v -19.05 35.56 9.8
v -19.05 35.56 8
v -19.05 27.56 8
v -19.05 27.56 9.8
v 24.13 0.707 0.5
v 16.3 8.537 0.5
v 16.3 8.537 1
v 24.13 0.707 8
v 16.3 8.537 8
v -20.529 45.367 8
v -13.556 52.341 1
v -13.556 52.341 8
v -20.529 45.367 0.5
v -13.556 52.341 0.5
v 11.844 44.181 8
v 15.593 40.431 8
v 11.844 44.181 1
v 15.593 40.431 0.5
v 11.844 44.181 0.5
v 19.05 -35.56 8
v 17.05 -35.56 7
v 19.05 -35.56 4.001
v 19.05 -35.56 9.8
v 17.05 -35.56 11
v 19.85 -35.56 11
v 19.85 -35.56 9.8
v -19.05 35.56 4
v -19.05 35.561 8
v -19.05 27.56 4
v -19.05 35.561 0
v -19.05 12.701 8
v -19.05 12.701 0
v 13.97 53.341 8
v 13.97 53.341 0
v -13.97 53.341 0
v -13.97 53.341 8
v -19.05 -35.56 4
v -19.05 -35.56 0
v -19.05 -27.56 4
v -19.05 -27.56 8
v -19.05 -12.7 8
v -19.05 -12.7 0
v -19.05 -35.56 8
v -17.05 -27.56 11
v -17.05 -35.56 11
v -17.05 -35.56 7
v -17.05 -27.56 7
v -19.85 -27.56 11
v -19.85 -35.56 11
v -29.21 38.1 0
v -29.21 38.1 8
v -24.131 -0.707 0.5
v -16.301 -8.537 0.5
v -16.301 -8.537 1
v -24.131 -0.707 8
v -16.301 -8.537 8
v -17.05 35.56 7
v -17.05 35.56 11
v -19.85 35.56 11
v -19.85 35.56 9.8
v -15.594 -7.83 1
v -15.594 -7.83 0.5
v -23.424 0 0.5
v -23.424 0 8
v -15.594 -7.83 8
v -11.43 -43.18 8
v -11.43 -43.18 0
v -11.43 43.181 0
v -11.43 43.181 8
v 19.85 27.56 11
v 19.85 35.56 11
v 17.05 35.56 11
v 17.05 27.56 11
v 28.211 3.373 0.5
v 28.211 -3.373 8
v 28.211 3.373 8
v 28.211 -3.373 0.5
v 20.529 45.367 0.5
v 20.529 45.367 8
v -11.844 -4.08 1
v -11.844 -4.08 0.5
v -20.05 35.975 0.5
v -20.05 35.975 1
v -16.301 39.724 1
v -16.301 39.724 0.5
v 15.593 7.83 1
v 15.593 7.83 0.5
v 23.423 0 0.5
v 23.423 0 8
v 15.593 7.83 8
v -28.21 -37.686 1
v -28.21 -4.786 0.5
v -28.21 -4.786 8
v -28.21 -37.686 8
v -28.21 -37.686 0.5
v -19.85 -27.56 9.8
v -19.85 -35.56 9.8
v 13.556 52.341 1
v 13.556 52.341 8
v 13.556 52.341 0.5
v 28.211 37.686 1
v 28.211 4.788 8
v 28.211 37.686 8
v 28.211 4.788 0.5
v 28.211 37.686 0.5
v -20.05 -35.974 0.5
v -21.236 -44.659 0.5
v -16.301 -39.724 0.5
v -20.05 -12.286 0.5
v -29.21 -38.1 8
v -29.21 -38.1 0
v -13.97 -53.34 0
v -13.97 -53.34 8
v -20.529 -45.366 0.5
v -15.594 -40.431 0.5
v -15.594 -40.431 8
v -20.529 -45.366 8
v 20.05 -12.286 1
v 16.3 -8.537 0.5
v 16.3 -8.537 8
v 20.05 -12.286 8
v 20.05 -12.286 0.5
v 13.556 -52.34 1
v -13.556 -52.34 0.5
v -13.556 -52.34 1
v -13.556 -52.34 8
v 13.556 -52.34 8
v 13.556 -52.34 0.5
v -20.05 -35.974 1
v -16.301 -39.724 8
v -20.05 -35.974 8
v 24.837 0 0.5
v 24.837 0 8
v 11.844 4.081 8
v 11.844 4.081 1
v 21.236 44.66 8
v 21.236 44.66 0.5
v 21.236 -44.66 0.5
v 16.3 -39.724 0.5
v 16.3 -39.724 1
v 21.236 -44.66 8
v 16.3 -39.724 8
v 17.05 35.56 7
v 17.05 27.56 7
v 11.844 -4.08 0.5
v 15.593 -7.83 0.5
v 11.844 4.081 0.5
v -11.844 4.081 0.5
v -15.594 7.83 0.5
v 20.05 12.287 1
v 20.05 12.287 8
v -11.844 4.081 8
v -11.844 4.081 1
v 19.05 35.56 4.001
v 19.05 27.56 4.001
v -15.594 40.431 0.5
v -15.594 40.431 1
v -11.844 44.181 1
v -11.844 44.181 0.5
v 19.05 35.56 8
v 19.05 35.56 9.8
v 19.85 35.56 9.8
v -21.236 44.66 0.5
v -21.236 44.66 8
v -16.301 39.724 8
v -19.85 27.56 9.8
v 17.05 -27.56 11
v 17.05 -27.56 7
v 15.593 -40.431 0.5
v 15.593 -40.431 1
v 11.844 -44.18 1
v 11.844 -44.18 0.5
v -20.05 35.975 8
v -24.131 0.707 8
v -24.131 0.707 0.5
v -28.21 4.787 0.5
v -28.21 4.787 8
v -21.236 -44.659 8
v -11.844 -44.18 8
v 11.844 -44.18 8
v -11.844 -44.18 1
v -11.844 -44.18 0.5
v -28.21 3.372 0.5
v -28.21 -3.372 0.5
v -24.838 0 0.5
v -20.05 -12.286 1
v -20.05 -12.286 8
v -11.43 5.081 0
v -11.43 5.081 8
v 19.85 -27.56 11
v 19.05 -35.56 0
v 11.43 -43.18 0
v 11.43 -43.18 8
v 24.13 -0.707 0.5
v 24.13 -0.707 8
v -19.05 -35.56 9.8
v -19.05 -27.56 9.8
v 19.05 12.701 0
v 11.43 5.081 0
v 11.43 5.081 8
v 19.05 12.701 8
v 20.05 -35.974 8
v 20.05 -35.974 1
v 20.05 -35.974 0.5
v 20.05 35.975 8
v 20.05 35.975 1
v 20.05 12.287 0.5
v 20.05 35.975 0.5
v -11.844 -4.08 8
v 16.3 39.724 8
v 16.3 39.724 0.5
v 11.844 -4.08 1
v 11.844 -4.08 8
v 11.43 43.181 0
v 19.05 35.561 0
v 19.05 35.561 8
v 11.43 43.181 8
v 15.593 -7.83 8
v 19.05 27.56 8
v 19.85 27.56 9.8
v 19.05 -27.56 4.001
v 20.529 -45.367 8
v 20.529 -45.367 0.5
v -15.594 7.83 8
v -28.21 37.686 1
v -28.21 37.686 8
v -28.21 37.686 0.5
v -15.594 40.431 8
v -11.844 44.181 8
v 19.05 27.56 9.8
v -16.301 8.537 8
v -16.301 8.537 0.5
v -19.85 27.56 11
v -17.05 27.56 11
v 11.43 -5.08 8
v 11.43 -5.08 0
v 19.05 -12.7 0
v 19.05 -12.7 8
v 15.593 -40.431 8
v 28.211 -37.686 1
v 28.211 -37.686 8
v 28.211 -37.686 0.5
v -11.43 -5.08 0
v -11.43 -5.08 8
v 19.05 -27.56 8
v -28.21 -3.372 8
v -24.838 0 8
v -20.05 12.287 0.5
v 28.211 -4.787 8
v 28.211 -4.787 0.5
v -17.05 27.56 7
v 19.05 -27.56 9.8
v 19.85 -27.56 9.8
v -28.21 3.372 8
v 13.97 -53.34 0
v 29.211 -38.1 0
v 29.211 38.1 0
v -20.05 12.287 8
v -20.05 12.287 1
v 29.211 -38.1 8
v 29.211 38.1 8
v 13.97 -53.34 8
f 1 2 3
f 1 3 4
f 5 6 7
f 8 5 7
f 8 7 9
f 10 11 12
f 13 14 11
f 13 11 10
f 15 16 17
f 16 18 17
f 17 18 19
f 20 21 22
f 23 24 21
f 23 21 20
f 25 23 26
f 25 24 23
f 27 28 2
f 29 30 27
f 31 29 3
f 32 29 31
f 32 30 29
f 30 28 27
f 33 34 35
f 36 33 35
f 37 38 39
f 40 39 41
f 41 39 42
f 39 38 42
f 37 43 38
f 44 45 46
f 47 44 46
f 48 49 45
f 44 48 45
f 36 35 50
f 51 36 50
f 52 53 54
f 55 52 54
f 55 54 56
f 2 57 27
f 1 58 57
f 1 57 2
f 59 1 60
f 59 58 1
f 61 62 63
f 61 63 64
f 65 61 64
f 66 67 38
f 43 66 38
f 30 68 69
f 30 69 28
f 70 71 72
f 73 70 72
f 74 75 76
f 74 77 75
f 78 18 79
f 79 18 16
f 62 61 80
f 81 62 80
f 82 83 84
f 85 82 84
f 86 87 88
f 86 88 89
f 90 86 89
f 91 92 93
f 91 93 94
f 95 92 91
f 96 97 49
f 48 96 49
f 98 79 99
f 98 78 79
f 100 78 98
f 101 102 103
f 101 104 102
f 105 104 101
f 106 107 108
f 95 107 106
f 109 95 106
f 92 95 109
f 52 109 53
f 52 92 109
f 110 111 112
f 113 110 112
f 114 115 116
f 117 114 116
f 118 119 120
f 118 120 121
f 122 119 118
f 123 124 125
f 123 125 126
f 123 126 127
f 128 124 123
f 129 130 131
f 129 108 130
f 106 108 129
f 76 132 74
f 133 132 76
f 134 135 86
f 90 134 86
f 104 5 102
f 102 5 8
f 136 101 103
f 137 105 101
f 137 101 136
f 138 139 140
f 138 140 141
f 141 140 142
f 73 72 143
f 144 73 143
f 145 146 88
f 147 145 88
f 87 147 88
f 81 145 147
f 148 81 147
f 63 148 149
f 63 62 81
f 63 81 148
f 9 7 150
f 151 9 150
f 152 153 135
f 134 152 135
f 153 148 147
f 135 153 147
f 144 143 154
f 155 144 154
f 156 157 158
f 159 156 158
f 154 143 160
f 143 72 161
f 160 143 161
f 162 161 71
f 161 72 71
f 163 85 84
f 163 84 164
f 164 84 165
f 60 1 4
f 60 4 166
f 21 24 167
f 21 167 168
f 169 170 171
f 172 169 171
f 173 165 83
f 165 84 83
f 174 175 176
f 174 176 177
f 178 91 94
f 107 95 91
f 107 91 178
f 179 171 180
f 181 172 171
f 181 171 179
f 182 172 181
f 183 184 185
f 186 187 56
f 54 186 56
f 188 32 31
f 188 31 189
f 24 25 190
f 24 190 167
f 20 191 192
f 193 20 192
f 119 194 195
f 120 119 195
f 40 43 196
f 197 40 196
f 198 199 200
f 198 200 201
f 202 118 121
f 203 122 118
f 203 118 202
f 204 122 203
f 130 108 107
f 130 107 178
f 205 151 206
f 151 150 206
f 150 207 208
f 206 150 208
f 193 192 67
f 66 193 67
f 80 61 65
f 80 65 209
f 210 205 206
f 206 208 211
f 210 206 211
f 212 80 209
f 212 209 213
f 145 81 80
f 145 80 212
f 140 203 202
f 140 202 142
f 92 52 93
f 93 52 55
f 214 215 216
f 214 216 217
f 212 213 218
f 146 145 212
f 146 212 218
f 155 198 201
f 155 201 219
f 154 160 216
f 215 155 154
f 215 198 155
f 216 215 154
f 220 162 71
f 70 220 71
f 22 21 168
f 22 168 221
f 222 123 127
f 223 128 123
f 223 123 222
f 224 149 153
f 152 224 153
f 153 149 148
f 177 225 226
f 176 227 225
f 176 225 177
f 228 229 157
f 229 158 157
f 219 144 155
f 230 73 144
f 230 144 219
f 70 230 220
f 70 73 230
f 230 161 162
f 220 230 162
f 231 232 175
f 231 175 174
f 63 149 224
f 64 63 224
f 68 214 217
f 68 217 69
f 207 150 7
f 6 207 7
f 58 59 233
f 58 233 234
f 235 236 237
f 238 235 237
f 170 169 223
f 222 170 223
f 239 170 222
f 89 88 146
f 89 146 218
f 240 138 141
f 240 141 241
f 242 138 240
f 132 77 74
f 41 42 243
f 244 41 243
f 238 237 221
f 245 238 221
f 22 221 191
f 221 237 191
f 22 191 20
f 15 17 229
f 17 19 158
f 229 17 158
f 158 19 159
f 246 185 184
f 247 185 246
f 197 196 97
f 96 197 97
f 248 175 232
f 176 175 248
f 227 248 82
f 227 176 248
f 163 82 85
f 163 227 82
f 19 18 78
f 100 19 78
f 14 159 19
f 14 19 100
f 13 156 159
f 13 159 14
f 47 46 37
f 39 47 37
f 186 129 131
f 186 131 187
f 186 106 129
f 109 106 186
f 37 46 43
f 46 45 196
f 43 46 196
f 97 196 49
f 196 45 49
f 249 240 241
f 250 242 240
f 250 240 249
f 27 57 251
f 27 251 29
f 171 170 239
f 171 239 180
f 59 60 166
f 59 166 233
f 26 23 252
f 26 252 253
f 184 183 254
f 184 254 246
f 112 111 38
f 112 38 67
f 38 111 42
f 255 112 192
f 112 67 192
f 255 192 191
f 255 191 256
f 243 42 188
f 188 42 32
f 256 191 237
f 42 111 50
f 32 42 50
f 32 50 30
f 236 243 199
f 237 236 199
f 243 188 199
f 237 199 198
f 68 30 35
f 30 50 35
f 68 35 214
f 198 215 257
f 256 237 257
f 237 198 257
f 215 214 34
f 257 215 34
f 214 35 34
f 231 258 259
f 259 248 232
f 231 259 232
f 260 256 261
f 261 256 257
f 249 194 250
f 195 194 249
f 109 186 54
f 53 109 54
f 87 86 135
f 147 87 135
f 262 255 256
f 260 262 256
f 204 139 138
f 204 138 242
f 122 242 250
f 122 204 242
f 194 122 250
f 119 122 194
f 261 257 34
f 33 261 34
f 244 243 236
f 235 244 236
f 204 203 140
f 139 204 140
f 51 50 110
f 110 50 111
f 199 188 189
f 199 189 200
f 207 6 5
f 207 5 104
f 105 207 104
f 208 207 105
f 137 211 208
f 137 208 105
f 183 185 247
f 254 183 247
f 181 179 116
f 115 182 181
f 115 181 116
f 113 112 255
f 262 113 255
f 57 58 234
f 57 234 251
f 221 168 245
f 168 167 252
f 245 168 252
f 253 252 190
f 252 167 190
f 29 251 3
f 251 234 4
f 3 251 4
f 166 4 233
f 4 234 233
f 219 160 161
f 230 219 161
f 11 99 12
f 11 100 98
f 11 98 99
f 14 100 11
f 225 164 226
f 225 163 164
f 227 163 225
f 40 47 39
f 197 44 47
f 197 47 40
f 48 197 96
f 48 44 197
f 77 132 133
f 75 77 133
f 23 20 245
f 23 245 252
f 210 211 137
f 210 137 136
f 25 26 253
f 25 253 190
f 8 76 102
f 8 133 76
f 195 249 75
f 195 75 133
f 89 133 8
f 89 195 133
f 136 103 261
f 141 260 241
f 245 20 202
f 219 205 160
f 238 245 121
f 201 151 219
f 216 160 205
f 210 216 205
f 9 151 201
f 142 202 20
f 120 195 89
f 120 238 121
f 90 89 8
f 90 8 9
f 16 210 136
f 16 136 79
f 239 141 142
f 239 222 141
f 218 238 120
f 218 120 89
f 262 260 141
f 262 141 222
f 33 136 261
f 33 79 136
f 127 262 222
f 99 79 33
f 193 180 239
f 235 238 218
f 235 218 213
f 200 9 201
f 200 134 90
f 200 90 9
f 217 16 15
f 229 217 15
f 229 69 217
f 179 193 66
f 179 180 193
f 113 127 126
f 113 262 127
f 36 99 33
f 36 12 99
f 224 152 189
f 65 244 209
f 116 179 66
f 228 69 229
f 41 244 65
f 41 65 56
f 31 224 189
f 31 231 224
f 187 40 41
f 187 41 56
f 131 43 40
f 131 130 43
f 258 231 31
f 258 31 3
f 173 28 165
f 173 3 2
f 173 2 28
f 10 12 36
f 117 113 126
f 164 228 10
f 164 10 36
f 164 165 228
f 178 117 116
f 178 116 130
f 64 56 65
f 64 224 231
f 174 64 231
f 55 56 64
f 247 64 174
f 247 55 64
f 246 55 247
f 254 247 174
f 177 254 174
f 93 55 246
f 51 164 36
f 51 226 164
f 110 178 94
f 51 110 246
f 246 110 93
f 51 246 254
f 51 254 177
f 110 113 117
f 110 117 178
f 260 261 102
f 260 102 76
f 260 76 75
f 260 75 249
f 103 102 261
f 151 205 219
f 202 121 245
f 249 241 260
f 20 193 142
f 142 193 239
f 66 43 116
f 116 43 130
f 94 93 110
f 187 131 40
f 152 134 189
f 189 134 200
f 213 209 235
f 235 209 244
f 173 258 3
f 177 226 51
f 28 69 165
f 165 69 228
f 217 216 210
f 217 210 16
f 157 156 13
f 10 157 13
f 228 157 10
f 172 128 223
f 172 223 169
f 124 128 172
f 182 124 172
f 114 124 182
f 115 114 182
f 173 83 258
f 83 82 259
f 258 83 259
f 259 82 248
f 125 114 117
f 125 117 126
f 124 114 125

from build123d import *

# Parameters (mm, degrees)
PAD_DEPTH    = 8
THICKNESS_T  = -1
POCKET_DEPTH = 0.5
PAD001_DEPTH = 8
PAD002_DEPTH = 8
SKETCH003_W  = 1
SKETCH003_H  = 7.5
PAD003_DEPTH = 18
SKETCH004_W  = 1
SKETCH004_H  = 7.5
PAD004_DEPTH = 18
SKETCH005_W  = 1
SKETCH005_H  = 7.5
PAD005_DEPTH = 18
SKETCH006_W  = 1
SKETCH006_H  = 7.5
PAD006_DEPTH = 18
SKETCH007_W  = 1
SKETCH007_H  = 7.5
PAD007_DEPTH = 7
SKETCH008_W  = 1
SKETCH008_H  = 7.5
PAD008_DEPTH = 7
SKETCH009_W  = 1
SKETCH009_H  = 7.5
PAD009_DEPTH = 7
SKETCH010_W  = 1
SKETCH010_H  = 7.5
PAD010_DEPTH = 7


with BuildPart() as part:
    # Sketch → Pad (new body)
    with BuildSketch(Plane.XY):
        Polygon((-29.21, 38.1002724549), (-29.21, -38.0997275451), (-13.9697275451, -53.34), (13.9702724549, -53.34), (29.2105449098, -38.0997275451), (29.2105449098, 38.1002724549), (13.9702724549, 53.3405449098), (-13.9697275451, 53.3405449098), align=None)
        Polygon((-19.05, 35.5607622358), (-19.05, 12.7007622358), (-11.4302173259, 5.0809795617), (11.4297826741, 5.0809795617), (19.0495653481, 12.7007622358), (19.0495653481, 35.5607622358), (11.4297826741, 43.1805449098), (-11.4302173259, 43.1805449098), align=None, mode=Mode.SUBTRACT)
        Polygon((-19.05, -35.5602173259), (-19.05, -12.7002173259), (-11.4302173259, -5.0804346519), (11.4297826741, -5.0804346519), (19.0495653481, -12.7002173259), (19.0495653481, -35.5602173259), (11.4297826741, -43.18), (-11.4302173259, -43.18), align=None, mode=Mode.SUBTRACT)
    extrude(amount=PAD_DEPTH)

    # Thickness
    thickness_openings = [part.faces().sort_by_distance(p)[0] for p in [
        (0.000695, 0.000272, 8),
    ]]
    offset(amount=THICKNESS_T, openings=thickness_openings, kind=Kind.INTERSECTION)

    # Thickness Face35 → Pocket (cut)
    with BuildSketch(Plane(origin=(0.0008428897, 0.0002724549, 1), x_dir=(0, 1, 0), z_dir=(0, 0, 1))):
        Polygon((37.6857864376, 28.2108428897), (-37.6857864376, 28.2108428897), (-52.3402724549, 13.5563568724), (-52.3402724549, -13.5552160028), (-37.6857864376, -28.2097020201), (37.6857864376, -28.2097020201), (52.3402724549, -13.5552160028), (52.3402724549, 13.5563568724), align=None)
        Polygon((35.9747033432, 20.0508428897), (44.1802724549, 11.845273778), (44.1802724549, -11.8431533467), (35.9747033432, -20.0487224584), (12.2862762185, -20.0487224584), (4.0807071068, -11.8431533467), (4.0807071068, 11.845273778), (12.2862762185, 20.0508428897), align=None, mode=Mode.SUBTRACT)
        Polygon((-35.9747033432, 20.0508428897), (-12.2862762185, 20.0508428897), (-4.0807071068, 11.845273778), (-4.0807071068, -11.8431533467), (-12.2862762185, -20.0487224584), (-35.9747033432, -20.0487224584), (-44.1802724549, -11.8431533467), (-44.1802724549, 11.845273778), align=None, mode=Mode.SUBTRACT)
    extrude(amount=-POCKET_DEPTH, mode=Mode.SUBTRACT)

    # Sketch001 → Pad001 (join)
    with BuildSketch(Plane.XZ.offset(35.56)):
        Polygon((-19.05, 4), (-19.05, 9.8), (-19.85, 9.8), (-19.85, 11), (-17.05, 11), (-17.05, 7), align=None)
        Polygon((19.05, 4), (19.05, 9.8), (19.85, 9.8), (19.85, 11), (17.05, 11), (17.05, 7), align=None)
    extrude(amount=-PAD001_DEPTH)

    # Sketch002 → Pad002 (join)
    with BuildSketch(Plane.XZ.offset(-35.56)):
        Polygon((-19.05, 4), (-19.05, 9.8), (-19.85, 9.8), (-19.85, 11), (-17.05, 11), (-17.05, 7), align=None)
        Polygon((19.05, 4), (19.05, 9.8), (19.85, 9.8), (19.85, 11), (17.05, 11), (17.05, 7), align=None)
    extrude(amount=PAD002_DEPTH)

    # Sketch003 (on Face77 of Pad002) → Pad003 (join)
    with BuildSketch(Plane(origin=(3.8815083374, -3.8815083374, 0), x_dir=(0.7071067812, 0.7071067812, 0), z_dir=(0.7071067812, -0.7071067812, 0))):
        with Locations((17.0628719395, 4.25)):
            Rectangle(SKETCH003_W, SKETCH003_H)
    extrude(amount=PAD003_DEPTH)

    # Sketch004 (on Face56 of Pad003) → Pad004 (join)
    with BuildSketch(Plane(origin=(3.8817807923, 3.8817807923, 0), x_dir=(-0.7071067812, 0.7071067812, 0), z_dir=(0.7071067812, 0.7071067812, 0))):
        with Locations((-17.06248663, 4.25)):
            Rectangle(SKETCH004_W, SKETCH004_H)
    extrude(amount=PAD004_DEPTH)

    # Sketch005 (on Face84 of Pad004) → Pad005 (join)
    with BuildSketch(Plane(origin=(-3.8817256633, -3.8817256633, 0), x_dir=(0.7071067812, -0.7071067812, 0), z_dir=(-0.7071067812, -0.7071067812, 0))):
        with Locations((-17.0631792847, 4.25)):
            Rectangle(SKETCH005_W, SKETCH005_H)
    extrude(amount=PAD005_DEPTH)

    # Sketch006 (on Face69 of Pad005) → Pad006 (join)
    with BuildSketch(Plane(origin=(-3.8819981182, 3.8819981182, 0), x_dir=(-0.7071067812, -0.7071067812, 0), z_dir=(-0.7071067812, 0.7071067812, 0))):
        with Locations((17.0627939753, 4.25)):
            Rectangle(SKETCH006_W, SKETCH006_H)
    extrude(amount=PAD006_DEPTH)

    # Sketch007 (on Face79 of Pad006) → Pad007 (join)
    with BuildSketch(Plane(origin=(-28.0124878991, 28.0124878991, 0), x_dir=(-0.7071067812, -0.7071067812, 0), z_dir=(-0.7071067812, 0.7071067812, 0))):
        with Locations((-17.0628719395, 4.25)):
            Rectangle(SKETCH007_W, SKETCH007_H)
    extrude(amount=PAD007_DEPTH)

    # Sketch008 (on Face73 of Pad007) → Pad008 (join)
    with BuildSketch(Plane(origin=(-28.0122154442, -28.0122154442, 0), x_dir=(0.7071067812, -0.7071067812, 0), z_dir=(-0.7071067812, -0.7071067812, 0))):
        with Locations((17.06248663, 4.25)):
            Rectangle(SKETCH008_W, SKETCH008_H)
    extrude(amount=PAD008_DEPTH)

    # Sketch009 (on Face64 of Pad008) → Pad009 (join)
    with BuildSketch(Plane(origin=(28.0119981182, -28.0119981182, 0), x_dir=(0.7071067812, 0.7071067812, 0), z_dir=(0.7071067812, -0.7071067812, 0))):
        with Locations((-17.0627939753, 4.25)):
            Rectangle(SKETCH009_W, SKETCH009_H)
    extrude(amount=PAD009_DEPTH)

    # Sketch010 (on Face62 of Pad009) → Pad010 (join)
    with BuildSketch(Plane(origin=(28.0122705731, 28.0122705731, 0), x_dir=(-0.7071067812, 0.7071067812, 0), z_dir=(0.7071067812, 0.7071067812, 0))):
        with Locations((17.0631792847, 4.25)):
            Rectangle(SKETCH010_W, SKETCH010_H)
    extrude(amount=PAD010_DEPTH)


solid = part.part
